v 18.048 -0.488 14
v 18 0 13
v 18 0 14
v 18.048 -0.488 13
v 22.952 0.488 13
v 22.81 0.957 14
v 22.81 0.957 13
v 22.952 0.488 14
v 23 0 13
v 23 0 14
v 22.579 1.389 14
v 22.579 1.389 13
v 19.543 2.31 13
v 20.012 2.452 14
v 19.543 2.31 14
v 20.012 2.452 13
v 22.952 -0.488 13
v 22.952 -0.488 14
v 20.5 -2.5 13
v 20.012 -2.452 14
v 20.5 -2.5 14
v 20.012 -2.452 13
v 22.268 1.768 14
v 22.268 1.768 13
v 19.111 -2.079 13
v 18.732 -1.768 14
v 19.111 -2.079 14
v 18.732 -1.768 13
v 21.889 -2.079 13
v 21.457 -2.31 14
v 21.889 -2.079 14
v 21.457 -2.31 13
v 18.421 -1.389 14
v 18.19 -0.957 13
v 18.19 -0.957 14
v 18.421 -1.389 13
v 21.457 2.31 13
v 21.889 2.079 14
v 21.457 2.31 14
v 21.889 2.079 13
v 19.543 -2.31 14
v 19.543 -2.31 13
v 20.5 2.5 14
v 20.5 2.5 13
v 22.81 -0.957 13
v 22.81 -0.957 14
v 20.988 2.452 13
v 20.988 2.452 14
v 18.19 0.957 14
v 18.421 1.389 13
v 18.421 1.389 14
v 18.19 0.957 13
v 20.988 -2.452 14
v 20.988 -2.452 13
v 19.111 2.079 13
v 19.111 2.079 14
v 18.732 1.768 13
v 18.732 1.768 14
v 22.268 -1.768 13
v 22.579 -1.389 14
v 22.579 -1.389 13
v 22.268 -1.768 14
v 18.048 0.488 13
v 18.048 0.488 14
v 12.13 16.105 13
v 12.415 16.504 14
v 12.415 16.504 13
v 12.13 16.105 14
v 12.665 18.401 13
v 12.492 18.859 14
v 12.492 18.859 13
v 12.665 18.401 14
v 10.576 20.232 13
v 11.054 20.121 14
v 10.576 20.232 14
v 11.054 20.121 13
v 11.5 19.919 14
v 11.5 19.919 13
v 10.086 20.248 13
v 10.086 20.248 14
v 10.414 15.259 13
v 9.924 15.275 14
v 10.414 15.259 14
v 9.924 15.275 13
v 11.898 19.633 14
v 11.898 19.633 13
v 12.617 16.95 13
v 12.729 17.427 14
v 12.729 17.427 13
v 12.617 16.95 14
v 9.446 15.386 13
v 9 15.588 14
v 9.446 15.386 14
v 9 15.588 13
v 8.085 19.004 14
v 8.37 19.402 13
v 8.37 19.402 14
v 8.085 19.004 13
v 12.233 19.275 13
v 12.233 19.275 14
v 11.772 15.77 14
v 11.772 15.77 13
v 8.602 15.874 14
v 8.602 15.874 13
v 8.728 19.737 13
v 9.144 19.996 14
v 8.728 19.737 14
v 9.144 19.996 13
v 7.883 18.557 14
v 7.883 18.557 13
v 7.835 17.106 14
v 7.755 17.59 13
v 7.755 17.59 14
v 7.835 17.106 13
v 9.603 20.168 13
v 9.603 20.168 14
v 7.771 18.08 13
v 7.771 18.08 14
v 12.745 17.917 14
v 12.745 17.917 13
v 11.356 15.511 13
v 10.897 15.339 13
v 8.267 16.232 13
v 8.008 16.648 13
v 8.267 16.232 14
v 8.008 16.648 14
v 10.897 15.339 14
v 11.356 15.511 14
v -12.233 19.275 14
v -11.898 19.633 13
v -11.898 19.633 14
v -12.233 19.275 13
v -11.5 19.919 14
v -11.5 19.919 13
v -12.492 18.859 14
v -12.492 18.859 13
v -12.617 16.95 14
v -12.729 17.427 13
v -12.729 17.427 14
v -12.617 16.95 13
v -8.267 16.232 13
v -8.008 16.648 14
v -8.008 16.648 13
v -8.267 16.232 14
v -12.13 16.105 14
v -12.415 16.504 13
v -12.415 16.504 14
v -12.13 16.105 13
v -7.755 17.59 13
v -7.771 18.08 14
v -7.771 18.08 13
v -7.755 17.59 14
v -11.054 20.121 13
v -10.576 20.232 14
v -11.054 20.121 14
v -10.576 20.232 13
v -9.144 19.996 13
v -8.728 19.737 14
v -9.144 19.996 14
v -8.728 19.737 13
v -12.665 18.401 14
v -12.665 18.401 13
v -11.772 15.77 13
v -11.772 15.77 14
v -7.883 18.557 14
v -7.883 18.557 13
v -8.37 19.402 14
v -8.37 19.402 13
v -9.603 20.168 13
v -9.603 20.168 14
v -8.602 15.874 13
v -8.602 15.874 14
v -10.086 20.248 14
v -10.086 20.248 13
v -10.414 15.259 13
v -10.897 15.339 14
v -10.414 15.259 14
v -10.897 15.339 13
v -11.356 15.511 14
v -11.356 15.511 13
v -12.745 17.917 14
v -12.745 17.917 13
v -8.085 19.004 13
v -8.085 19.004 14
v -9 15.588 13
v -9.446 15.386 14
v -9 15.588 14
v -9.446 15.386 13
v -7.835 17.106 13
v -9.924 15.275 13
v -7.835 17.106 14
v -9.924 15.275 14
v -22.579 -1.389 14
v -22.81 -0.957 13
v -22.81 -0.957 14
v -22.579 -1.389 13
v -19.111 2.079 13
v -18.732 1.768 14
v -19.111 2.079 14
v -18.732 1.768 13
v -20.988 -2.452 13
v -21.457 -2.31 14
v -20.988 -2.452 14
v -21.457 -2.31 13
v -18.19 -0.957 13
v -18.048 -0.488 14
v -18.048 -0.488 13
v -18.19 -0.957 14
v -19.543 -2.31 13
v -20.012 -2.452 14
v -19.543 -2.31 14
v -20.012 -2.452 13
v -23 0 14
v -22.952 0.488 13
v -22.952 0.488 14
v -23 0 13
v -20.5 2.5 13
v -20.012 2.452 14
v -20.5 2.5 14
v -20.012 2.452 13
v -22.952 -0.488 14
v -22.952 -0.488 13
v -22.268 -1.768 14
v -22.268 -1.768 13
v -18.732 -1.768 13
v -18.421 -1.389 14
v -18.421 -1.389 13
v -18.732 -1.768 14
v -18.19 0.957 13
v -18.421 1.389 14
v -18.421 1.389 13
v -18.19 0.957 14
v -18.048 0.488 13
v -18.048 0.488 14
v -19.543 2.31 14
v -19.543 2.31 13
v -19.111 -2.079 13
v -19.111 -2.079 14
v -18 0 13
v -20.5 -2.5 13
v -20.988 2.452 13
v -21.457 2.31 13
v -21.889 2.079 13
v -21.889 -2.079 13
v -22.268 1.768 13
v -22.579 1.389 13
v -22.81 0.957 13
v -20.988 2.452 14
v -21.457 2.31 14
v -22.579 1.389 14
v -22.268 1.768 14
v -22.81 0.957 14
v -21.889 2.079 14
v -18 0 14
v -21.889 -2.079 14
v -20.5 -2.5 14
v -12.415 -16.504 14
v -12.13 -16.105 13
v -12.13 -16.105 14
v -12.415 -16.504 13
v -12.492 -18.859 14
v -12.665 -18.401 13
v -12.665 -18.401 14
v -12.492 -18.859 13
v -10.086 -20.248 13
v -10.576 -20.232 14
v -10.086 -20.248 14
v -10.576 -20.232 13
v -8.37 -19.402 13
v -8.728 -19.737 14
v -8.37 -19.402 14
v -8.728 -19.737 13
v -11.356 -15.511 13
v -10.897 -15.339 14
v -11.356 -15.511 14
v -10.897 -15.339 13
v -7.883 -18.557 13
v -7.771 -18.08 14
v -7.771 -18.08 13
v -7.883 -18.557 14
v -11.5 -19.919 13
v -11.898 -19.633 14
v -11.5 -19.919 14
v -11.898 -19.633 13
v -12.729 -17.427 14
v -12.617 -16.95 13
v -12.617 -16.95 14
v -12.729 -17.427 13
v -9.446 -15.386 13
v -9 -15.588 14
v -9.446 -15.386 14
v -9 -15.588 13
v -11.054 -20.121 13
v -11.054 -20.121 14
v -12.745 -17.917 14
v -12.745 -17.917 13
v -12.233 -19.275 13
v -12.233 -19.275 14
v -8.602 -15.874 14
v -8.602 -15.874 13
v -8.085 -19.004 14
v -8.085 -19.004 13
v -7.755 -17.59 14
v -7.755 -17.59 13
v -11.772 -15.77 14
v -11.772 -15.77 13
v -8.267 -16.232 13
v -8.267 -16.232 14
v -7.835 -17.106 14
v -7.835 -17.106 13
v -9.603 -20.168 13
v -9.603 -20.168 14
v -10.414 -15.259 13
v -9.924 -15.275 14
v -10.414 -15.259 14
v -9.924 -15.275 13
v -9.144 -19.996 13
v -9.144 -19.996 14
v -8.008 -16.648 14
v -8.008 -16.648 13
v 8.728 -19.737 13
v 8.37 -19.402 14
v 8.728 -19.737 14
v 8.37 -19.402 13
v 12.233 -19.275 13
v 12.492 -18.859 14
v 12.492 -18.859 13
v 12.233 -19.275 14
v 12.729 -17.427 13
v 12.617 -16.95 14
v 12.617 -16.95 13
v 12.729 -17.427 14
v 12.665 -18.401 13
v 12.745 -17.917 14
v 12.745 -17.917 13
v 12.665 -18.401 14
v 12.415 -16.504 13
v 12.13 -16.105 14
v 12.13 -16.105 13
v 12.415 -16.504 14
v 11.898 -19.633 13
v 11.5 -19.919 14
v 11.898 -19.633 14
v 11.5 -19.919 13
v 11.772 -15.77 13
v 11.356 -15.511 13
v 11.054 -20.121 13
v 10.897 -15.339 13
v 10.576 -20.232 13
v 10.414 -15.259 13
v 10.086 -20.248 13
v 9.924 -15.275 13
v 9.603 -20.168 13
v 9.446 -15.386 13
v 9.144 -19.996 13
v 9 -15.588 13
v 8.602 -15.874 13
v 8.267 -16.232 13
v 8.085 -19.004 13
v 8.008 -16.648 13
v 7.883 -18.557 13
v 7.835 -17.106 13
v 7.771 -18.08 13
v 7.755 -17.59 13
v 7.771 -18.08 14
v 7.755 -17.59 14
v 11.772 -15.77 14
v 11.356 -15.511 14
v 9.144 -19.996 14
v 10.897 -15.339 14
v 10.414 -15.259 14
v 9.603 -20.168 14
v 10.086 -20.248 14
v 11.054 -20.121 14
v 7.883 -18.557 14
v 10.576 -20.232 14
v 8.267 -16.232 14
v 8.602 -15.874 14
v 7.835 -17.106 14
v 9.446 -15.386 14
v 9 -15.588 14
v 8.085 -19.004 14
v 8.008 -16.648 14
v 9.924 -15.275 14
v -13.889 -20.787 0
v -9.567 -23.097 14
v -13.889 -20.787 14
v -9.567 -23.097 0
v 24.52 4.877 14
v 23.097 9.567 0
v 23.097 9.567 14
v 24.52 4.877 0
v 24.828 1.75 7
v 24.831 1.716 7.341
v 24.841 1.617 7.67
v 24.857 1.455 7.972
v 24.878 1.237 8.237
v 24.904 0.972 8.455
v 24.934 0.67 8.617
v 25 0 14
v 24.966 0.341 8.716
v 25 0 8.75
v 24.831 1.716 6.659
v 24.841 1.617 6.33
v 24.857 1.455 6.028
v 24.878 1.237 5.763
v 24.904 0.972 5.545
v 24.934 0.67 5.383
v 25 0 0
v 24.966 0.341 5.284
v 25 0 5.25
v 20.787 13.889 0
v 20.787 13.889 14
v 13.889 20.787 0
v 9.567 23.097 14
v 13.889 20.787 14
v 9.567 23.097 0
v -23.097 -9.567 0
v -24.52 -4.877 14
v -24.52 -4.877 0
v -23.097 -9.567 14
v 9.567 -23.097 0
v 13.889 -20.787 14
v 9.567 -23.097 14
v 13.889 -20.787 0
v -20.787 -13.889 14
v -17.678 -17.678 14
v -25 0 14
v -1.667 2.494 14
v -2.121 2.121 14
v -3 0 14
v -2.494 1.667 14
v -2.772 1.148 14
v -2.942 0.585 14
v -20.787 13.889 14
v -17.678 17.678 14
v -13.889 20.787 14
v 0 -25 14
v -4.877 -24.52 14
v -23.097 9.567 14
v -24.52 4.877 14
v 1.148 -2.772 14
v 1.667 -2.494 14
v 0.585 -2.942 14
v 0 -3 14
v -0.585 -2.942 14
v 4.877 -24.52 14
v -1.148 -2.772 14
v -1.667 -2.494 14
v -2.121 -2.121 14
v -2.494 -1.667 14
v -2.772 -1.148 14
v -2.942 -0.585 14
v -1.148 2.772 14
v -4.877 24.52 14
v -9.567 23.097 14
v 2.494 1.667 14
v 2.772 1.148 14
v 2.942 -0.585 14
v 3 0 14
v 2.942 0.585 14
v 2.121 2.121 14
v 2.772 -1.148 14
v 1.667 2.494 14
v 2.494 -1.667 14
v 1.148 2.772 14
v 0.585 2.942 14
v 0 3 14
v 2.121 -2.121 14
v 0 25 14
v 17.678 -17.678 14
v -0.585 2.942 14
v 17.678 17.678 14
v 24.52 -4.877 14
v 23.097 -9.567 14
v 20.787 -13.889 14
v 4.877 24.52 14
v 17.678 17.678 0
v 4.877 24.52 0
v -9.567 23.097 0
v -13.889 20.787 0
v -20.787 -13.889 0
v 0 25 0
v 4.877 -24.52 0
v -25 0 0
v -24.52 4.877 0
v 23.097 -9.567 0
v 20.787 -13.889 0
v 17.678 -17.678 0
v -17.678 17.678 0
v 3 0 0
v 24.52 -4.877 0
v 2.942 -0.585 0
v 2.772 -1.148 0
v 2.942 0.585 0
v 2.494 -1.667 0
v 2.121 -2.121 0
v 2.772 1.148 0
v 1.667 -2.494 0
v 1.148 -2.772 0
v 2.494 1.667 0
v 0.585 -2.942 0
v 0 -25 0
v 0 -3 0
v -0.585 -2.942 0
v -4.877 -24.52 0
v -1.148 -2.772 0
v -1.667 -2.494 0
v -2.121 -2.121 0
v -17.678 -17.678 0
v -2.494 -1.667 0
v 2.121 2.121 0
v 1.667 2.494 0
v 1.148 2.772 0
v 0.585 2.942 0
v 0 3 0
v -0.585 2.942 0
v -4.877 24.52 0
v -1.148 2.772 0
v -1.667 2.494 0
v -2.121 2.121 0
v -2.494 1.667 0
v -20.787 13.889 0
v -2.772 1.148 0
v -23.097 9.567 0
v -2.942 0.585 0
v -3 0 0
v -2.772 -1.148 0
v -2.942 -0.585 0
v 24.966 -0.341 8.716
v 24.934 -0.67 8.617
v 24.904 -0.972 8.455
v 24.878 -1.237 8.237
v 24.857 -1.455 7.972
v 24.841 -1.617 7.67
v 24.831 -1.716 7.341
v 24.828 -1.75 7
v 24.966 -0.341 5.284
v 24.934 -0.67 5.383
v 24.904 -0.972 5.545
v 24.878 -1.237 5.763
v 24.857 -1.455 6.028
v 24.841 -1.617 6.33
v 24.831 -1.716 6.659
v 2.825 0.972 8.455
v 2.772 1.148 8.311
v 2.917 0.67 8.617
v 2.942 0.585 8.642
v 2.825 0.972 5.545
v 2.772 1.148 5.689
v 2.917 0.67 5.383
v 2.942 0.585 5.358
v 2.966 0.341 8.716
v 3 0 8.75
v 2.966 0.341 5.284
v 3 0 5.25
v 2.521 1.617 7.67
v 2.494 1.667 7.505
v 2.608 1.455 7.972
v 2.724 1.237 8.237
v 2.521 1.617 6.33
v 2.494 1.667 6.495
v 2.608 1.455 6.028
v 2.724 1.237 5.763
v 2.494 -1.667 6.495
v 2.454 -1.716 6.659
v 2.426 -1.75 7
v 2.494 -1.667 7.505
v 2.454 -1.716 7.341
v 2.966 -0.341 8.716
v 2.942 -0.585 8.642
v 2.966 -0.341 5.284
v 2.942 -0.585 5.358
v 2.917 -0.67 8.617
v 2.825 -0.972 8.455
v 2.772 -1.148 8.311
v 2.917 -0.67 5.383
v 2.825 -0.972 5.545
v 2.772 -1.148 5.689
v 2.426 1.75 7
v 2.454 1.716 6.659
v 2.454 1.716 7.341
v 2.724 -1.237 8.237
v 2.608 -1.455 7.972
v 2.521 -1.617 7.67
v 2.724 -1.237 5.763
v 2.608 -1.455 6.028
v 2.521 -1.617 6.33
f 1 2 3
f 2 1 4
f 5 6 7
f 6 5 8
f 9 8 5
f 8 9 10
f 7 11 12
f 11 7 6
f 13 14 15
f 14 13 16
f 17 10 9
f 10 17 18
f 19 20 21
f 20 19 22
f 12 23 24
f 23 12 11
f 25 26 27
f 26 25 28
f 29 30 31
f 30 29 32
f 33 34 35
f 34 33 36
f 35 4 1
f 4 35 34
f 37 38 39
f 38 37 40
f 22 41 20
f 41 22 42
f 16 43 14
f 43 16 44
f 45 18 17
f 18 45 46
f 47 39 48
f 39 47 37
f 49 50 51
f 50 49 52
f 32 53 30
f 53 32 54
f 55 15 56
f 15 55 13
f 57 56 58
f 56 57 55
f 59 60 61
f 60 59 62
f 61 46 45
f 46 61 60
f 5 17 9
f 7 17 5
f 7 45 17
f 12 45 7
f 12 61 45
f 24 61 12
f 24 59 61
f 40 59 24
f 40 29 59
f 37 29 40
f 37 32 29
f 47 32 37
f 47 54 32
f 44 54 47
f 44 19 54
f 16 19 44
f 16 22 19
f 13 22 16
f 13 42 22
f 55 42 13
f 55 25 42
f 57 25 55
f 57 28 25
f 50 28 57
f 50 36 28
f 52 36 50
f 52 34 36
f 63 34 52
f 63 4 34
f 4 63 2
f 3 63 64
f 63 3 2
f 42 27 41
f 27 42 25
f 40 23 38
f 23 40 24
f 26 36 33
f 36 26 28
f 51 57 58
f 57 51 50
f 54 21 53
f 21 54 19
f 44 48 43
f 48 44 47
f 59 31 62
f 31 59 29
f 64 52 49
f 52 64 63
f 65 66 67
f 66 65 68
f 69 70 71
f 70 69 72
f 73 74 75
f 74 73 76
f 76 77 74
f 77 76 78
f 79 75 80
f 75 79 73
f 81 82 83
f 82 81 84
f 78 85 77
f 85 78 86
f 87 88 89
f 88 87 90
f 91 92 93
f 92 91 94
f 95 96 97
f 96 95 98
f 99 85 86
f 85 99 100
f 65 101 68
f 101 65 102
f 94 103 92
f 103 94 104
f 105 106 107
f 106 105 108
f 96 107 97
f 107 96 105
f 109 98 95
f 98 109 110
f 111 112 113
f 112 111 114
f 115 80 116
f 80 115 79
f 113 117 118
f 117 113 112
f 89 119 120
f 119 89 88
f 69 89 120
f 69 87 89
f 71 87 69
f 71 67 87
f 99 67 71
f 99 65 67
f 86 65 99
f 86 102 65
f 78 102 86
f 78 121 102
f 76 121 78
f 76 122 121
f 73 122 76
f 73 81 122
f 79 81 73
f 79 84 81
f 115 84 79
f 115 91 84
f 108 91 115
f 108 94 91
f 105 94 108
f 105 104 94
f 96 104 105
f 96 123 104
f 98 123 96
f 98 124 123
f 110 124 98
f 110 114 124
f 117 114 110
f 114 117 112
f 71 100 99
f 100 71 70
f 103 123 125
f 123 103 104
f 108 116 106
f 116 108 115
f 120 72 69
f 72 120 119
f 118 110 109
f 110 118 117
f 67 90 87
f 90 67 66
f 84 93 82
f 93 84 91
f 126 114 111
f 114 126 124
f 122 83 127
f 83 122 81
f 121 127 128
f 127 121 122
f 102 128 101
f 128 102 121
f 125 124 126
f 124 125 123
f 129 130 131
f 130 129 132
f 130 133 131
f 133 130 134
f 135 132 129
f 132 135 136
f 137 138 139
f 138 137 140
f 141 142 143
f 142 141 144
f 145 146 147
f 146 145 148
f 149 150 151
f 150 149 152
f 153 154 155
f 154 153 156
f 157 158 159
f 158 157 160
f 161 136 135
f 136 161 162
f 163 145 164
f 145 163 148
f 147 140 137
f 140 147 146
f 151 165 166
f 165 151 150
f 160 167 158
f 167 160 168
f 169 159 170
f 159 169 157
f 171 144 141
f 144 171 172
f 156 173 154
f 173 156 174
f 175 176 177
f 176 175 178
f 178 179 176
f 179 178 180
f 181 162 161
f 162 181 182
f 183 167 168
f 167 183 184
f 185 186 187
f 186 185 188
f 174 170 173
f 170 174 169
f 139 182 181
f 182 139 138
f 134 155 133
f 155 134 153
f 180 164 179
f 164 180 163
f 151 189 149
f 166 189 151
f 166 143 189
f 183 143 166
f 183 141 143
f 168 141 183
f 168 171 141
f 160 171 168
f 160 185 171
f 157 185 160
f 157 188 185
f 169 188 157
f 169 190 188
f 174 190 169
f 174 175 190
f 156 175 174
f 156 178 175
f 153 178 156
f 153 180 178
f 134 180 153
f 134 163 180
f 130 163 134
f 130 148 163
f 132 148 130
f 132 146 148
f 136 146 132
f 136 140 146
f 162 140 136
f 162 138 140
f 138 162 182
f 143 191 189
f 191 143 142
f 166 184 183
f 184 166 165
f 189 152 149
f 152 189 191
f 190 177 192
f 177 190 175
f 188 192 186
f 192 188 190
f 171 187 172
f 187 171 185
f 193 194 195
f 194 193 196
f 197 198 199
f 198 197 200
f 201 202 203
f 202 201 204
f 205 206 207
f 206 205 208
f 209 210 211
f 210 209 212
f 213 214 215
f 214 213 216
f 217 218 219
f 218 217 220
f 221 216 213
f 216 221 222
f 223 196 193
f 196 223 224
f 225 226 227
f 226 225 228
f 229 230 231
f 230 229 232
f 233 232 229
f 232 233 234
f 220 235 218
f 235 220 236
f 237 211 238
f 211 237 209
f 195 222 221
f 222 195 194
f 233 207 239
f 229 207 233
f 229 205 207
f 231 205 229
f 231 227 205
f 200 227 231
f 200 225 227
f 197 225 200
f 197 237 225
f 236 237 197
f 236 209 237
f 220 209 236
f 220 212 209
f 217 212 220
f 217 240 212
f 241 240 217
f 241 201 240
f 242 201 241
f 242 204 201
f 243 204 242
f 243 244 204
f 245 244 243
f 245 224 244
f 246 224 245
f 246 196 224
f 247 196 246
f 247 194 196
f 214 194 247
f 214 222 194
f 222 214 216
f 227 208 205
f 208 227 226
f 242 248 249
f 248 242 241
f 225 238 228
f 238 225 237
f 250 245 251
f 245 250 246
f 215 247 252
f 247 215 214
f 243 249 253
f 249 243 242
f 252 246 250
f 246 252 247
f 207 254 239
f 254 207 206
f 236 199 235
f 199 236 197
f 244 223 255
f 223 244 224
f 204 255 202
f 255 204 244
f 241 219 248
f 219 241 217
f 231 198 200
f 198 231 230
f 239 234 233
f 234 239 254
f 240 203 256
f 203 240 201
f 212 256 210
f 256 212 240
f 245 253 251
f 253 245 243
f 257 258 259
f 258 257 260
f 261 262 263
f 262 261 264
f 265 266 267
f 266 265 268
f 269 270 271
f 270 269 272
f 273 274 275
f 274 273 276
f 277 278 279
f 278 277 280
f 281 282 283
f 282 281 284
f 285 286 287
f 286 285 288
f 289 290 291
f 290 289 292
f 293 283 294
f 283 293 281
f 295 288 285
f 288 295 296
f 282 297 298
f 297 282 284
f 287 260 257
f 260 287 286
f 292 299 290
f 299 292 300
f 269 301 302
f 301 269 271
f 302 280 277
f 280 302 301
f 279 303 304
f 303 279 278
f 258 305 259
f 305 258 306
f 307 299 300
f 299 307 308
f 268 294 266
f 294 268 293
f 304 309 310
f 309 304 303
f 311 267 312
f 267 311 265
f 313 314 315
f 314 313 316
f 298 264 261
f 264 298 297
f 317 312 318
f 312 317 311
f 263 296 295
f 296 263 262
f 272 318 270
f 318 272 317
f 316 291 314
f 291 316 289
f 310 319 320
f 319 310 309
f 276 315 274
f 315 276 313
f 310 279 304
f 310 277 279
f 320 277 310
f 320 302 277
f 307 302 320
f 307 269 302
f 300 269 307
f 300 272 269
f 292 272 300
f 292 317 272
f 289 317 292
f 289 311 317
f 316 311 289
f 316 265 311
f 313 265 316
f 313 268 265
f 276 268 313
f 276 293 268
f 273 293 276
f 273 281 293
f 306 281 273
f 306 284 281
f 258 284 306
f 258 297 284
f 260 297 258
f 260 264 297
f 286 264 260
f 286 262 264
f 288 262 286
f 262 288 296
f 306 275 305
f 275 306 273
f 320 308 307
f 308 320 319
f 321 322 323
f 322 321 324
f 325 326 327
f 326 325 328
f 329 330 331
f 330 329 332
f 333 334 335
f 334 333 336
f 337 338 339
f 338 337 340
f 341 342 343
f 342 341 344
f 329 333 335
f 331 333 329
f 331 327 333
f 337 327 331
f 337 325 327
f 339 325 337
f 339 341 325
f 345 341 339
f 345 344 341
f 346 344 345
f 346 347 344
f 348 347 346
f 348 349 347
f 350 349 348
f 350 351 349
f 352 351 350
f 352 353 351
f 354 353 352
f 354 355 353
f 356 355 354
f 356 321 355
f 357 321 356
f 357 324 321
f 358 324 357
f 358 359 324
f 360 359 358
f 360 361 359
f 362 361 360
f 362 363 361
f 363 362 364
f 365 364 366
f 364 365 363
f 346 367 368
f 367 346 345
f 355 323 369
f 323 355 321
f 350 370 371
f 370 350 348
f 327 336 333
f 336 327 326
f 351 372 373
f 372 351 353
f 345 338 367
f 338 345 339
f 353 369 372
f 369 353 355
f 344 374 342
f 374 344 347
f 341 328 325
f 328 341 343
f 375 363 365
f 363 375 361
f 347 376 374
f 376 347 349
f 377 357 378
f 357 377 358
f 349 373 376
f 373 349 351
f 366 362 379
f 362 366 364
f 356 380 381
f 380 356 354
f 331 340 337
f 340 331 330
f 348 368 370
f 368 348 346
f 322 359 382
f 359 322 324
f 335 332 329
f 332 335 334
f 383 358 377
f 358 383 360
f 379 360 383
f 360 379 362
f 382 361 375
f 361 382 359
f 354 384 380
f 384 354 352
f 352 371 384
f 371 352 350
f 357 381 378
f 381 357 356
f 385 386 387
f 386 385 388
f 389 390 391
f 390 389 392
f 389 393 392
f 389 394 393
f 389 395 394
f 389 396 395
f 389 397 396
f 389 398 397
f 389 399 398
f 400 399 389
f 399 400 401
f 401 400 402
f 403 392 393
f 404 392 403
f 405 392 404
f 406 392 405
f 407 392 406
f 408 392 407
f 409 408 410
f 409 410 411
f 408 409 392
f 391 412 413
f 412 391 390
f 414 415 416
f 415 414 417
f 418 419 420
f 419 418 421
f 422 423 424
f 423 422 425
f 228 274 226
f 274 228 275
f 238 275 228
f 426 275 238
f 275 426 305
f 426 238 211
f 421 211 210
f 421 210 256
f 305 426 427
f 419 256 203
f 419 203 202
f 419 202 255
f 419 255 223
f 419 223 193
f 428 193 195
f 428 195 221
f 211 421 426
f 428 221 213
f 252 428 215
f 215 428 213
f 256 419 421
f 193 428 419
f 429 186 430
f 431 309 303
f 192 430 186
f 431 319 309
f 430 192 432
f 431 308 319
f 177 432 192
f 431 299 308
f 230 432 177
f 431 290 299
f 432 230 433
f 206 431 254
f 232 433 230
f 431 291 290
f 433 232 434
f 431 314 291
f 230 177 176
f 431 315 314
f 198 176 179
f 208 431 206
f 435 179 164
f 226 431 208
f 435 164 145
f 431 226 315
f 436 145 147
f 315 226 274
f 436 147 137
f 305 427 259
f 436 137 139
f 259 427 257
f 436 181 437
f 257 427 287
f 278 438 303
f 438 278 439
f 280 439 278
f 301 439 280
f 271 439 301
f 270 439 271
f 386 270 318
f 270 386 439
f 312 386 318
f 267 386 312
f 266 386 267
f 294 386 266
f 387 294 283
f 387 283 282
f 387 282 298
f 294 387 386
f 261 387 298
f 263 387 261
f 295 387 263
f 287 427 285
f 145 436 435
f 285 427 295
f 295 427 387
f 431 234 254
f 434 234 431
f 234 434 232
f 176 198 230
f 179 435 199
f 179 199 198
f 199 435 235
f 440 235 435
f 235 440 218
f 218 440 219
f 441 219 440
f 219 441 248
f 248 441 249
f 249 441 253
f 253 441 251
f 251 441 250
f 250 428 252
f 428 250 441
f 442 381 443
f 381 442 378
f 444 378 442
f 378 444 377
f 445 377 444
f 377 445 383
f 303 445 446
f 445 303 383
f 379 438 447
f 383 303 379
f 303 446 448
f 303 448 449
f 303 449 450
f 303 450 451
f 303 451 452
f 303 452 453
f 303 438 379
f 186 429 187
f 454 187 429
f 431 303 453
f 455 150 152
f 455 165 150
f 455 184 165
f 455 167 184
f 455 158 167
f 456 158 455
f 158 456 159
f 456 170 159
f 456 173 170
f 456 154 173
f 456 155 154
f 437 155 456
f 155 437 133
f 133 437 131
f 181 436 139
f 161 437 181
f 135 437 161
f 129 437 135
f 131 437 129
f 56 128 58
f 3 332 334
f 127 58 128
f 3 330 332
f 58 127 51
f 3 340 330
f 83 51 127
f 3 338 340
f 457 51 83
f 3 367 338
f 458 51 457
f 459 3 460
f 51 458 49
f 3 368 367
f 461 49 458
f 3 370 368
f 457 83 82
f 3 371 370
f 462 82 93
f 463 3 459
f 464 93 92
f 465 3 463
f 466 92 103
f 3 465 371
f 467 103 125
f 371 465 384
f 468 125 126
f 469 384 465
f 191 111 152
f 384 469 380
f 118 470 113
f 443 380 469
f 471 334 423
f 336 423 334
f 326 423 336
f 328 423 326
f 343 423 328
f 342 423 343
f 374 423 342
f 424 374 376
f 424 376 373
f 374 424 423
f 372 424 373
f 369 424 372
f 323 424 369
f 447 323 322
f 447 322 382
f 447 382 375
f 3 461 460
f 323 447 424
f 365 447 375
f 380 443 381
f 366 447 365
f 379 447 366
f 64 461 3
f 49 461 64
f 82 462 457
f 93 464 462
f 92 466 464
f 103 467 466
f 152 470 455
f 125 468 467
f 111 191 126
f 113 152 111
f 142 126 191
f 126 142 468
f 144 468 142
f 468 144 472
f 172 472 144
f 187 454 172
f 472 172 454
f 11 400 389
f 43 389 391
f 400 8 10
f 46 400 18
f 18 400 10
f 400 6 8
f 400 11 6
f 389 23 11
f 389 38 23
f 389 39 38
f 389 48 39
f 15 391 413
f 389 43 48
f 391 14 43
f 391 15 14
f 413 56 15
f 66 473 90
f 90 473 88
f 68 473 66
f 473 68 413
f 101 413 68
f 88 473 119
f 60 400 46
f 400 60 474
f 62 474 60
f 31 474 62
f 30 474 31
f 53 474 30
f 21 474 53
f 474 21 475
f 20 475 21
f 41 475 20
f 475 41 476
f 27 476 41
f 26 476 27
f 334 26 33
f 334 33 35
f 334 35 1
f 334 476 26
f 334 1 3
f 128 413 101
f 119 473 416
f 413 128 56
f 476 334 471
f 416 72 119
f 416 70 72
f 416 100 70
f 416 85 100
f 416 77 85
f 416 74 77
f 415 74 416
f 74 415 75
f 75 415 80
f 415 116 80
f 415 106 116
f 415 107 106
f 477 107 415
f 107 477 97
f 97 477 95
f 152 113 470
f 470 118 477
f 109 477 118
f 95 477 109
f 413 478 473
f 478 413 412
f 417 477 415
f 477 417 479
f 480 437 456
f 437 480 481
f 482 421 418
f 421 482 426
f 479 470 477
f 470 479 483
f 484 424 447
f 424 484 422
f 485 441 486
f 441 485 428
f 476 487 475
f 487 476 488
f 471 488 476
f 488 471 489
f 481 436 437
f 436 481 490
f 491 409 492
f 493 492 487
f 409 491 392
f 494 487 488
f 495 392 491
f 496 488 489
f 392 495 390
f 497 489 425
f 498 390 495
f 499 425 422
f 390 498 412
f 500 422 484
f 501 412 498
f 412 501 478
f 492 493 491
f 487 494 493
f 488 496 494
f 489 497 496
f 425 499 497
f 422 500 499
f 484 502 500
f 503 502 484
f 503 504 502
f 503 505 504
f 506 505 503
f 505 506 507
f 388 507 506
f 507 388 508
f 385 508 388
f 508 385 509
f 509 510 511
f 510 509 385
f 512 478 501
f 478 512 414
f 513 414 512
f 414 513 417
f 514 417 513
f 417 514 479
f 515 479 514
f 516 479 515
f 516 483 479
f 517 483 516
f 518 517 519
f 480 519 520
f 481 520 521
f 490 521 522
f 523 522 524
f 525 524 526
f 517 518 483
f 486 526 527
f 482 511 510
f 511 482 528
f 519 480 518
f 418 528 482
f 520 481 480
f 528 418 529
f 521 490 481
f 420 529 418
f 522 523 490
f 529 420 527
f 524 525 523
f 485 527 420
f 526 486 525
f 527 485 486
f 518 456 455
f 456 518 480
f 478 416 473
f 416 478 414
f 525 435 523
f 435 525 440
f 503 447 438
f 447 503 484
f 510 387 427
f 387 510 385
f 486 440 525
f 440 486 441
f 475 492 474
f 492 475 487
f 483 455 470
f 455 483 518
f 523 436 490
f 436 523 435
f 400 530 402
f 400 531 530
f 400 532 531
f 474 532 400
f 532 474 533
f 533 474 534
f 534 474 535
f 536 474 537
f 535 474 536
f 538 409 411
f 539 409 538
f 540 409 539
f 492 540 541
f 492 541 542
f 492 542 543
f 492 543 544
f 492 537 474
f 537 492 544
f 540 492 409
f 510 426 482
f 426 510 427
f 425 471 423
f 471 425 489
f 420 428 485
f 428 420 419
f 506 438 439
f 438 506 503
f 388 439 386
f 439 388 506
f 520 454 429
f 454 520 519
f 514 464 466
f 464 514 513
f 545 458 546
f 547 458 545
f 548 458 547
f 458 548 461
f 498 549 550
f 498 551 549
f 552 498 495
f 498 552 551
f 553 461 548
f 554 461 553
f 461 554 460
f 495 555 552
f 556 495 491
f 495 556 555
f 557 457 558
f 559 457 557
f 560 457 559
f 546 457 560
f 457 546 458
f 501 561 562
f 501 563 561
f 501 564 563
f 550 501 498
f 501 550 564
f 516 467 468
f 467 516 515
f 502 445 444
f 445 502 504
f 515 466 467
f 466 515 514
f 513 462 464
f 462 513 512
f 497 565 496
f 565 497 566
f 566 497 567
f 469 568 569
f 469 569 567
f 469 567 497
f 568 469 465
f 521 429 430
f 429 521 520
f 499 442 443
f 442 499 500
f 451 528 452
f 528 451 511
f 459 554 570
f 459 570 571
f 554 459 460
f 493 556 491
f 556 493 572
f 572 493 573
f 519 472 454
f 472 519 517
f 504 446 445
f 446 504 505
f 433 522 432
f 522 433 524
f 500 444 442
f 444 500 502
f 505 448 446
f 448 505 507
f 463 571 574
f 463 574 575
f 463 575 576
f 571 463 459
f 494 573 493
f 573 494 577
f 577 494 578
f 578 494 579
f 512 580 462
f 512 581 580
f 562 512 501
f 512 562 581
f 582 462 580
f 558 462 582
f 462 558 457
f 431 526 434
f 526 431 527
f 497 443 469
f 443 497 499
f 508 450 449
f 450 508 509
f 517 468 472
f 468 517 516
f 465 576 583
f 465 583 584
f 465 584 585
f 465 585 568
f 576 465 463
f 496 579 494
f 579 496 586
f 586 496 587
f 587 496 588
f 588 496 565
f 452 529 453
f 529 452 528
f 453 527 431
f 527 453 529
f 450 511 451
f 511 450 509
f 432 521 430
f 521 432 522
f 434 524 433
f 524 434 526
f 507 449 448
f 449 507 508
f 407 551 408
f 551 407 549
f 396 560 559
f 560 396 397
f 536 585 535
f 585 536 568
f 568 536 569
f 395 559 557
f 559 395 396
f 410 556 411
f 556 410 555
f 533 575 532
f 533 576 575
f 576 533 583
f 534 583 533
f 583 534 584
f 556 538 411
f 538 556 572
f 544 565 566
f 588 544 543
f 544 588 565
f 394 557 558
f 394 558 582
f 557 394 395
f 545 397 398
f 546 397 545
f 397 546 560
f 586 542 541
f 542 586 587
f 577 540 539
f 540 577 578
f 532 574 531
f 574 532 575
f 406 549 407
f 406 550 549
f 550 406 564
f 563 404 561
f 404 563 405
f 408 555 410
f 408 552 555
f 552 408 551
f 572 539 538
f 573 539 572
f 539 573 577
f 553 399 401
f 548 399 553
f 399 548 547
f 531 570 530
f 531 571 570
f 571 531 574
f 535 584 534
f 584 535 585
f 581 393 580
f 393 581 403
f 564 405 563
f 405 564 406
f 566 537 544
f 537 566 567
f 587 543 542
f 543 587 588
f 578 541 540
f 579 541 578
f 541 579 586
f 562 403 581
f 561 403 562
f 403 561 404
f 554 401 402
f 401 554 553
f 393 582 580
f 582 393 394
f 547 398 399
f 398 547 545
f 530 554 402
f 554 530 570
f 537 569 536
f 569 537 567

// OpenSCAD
$fn = 32;

// ----------------------------------------------------------------------
// Control knob: dimpled knob
// ----------------------------------------------------------------------

// --- parameters (mm) ---
dimp_d = 5;               // finger dimple diameter
n_dimp = 6;               // number of dimples
dimp_r = 20.5;            // dimple ring radius
knob_d = 50;              // knob body diameter
knob_h = 14;              // knob body height
bore_d = 6;               // shaft bore diameter
set_d = 3.5;              // set screw bore diameter

dimp_step = 360 / n_dimp;  // dimple angular step

difference() {
  cylinder(h = knob_h, d = knob_d);
  translate([0, 0, -1]) cylinder(h = knob_h + 2, d = bore_d);
  translate([-1, 0, knob_h / 2]) rotate([0, 90, 0])
    cylinder(h = knob_d / 2 + bore_d / 2 + 2, d = set_d);  for (i = [0 : n_dimp - 1])
    rotate([0, 0, i * dimp_step])
      translate([dimp_r, 0, knob_h - 1])
        cylinder(h = 2, d = dimp_d);
}
